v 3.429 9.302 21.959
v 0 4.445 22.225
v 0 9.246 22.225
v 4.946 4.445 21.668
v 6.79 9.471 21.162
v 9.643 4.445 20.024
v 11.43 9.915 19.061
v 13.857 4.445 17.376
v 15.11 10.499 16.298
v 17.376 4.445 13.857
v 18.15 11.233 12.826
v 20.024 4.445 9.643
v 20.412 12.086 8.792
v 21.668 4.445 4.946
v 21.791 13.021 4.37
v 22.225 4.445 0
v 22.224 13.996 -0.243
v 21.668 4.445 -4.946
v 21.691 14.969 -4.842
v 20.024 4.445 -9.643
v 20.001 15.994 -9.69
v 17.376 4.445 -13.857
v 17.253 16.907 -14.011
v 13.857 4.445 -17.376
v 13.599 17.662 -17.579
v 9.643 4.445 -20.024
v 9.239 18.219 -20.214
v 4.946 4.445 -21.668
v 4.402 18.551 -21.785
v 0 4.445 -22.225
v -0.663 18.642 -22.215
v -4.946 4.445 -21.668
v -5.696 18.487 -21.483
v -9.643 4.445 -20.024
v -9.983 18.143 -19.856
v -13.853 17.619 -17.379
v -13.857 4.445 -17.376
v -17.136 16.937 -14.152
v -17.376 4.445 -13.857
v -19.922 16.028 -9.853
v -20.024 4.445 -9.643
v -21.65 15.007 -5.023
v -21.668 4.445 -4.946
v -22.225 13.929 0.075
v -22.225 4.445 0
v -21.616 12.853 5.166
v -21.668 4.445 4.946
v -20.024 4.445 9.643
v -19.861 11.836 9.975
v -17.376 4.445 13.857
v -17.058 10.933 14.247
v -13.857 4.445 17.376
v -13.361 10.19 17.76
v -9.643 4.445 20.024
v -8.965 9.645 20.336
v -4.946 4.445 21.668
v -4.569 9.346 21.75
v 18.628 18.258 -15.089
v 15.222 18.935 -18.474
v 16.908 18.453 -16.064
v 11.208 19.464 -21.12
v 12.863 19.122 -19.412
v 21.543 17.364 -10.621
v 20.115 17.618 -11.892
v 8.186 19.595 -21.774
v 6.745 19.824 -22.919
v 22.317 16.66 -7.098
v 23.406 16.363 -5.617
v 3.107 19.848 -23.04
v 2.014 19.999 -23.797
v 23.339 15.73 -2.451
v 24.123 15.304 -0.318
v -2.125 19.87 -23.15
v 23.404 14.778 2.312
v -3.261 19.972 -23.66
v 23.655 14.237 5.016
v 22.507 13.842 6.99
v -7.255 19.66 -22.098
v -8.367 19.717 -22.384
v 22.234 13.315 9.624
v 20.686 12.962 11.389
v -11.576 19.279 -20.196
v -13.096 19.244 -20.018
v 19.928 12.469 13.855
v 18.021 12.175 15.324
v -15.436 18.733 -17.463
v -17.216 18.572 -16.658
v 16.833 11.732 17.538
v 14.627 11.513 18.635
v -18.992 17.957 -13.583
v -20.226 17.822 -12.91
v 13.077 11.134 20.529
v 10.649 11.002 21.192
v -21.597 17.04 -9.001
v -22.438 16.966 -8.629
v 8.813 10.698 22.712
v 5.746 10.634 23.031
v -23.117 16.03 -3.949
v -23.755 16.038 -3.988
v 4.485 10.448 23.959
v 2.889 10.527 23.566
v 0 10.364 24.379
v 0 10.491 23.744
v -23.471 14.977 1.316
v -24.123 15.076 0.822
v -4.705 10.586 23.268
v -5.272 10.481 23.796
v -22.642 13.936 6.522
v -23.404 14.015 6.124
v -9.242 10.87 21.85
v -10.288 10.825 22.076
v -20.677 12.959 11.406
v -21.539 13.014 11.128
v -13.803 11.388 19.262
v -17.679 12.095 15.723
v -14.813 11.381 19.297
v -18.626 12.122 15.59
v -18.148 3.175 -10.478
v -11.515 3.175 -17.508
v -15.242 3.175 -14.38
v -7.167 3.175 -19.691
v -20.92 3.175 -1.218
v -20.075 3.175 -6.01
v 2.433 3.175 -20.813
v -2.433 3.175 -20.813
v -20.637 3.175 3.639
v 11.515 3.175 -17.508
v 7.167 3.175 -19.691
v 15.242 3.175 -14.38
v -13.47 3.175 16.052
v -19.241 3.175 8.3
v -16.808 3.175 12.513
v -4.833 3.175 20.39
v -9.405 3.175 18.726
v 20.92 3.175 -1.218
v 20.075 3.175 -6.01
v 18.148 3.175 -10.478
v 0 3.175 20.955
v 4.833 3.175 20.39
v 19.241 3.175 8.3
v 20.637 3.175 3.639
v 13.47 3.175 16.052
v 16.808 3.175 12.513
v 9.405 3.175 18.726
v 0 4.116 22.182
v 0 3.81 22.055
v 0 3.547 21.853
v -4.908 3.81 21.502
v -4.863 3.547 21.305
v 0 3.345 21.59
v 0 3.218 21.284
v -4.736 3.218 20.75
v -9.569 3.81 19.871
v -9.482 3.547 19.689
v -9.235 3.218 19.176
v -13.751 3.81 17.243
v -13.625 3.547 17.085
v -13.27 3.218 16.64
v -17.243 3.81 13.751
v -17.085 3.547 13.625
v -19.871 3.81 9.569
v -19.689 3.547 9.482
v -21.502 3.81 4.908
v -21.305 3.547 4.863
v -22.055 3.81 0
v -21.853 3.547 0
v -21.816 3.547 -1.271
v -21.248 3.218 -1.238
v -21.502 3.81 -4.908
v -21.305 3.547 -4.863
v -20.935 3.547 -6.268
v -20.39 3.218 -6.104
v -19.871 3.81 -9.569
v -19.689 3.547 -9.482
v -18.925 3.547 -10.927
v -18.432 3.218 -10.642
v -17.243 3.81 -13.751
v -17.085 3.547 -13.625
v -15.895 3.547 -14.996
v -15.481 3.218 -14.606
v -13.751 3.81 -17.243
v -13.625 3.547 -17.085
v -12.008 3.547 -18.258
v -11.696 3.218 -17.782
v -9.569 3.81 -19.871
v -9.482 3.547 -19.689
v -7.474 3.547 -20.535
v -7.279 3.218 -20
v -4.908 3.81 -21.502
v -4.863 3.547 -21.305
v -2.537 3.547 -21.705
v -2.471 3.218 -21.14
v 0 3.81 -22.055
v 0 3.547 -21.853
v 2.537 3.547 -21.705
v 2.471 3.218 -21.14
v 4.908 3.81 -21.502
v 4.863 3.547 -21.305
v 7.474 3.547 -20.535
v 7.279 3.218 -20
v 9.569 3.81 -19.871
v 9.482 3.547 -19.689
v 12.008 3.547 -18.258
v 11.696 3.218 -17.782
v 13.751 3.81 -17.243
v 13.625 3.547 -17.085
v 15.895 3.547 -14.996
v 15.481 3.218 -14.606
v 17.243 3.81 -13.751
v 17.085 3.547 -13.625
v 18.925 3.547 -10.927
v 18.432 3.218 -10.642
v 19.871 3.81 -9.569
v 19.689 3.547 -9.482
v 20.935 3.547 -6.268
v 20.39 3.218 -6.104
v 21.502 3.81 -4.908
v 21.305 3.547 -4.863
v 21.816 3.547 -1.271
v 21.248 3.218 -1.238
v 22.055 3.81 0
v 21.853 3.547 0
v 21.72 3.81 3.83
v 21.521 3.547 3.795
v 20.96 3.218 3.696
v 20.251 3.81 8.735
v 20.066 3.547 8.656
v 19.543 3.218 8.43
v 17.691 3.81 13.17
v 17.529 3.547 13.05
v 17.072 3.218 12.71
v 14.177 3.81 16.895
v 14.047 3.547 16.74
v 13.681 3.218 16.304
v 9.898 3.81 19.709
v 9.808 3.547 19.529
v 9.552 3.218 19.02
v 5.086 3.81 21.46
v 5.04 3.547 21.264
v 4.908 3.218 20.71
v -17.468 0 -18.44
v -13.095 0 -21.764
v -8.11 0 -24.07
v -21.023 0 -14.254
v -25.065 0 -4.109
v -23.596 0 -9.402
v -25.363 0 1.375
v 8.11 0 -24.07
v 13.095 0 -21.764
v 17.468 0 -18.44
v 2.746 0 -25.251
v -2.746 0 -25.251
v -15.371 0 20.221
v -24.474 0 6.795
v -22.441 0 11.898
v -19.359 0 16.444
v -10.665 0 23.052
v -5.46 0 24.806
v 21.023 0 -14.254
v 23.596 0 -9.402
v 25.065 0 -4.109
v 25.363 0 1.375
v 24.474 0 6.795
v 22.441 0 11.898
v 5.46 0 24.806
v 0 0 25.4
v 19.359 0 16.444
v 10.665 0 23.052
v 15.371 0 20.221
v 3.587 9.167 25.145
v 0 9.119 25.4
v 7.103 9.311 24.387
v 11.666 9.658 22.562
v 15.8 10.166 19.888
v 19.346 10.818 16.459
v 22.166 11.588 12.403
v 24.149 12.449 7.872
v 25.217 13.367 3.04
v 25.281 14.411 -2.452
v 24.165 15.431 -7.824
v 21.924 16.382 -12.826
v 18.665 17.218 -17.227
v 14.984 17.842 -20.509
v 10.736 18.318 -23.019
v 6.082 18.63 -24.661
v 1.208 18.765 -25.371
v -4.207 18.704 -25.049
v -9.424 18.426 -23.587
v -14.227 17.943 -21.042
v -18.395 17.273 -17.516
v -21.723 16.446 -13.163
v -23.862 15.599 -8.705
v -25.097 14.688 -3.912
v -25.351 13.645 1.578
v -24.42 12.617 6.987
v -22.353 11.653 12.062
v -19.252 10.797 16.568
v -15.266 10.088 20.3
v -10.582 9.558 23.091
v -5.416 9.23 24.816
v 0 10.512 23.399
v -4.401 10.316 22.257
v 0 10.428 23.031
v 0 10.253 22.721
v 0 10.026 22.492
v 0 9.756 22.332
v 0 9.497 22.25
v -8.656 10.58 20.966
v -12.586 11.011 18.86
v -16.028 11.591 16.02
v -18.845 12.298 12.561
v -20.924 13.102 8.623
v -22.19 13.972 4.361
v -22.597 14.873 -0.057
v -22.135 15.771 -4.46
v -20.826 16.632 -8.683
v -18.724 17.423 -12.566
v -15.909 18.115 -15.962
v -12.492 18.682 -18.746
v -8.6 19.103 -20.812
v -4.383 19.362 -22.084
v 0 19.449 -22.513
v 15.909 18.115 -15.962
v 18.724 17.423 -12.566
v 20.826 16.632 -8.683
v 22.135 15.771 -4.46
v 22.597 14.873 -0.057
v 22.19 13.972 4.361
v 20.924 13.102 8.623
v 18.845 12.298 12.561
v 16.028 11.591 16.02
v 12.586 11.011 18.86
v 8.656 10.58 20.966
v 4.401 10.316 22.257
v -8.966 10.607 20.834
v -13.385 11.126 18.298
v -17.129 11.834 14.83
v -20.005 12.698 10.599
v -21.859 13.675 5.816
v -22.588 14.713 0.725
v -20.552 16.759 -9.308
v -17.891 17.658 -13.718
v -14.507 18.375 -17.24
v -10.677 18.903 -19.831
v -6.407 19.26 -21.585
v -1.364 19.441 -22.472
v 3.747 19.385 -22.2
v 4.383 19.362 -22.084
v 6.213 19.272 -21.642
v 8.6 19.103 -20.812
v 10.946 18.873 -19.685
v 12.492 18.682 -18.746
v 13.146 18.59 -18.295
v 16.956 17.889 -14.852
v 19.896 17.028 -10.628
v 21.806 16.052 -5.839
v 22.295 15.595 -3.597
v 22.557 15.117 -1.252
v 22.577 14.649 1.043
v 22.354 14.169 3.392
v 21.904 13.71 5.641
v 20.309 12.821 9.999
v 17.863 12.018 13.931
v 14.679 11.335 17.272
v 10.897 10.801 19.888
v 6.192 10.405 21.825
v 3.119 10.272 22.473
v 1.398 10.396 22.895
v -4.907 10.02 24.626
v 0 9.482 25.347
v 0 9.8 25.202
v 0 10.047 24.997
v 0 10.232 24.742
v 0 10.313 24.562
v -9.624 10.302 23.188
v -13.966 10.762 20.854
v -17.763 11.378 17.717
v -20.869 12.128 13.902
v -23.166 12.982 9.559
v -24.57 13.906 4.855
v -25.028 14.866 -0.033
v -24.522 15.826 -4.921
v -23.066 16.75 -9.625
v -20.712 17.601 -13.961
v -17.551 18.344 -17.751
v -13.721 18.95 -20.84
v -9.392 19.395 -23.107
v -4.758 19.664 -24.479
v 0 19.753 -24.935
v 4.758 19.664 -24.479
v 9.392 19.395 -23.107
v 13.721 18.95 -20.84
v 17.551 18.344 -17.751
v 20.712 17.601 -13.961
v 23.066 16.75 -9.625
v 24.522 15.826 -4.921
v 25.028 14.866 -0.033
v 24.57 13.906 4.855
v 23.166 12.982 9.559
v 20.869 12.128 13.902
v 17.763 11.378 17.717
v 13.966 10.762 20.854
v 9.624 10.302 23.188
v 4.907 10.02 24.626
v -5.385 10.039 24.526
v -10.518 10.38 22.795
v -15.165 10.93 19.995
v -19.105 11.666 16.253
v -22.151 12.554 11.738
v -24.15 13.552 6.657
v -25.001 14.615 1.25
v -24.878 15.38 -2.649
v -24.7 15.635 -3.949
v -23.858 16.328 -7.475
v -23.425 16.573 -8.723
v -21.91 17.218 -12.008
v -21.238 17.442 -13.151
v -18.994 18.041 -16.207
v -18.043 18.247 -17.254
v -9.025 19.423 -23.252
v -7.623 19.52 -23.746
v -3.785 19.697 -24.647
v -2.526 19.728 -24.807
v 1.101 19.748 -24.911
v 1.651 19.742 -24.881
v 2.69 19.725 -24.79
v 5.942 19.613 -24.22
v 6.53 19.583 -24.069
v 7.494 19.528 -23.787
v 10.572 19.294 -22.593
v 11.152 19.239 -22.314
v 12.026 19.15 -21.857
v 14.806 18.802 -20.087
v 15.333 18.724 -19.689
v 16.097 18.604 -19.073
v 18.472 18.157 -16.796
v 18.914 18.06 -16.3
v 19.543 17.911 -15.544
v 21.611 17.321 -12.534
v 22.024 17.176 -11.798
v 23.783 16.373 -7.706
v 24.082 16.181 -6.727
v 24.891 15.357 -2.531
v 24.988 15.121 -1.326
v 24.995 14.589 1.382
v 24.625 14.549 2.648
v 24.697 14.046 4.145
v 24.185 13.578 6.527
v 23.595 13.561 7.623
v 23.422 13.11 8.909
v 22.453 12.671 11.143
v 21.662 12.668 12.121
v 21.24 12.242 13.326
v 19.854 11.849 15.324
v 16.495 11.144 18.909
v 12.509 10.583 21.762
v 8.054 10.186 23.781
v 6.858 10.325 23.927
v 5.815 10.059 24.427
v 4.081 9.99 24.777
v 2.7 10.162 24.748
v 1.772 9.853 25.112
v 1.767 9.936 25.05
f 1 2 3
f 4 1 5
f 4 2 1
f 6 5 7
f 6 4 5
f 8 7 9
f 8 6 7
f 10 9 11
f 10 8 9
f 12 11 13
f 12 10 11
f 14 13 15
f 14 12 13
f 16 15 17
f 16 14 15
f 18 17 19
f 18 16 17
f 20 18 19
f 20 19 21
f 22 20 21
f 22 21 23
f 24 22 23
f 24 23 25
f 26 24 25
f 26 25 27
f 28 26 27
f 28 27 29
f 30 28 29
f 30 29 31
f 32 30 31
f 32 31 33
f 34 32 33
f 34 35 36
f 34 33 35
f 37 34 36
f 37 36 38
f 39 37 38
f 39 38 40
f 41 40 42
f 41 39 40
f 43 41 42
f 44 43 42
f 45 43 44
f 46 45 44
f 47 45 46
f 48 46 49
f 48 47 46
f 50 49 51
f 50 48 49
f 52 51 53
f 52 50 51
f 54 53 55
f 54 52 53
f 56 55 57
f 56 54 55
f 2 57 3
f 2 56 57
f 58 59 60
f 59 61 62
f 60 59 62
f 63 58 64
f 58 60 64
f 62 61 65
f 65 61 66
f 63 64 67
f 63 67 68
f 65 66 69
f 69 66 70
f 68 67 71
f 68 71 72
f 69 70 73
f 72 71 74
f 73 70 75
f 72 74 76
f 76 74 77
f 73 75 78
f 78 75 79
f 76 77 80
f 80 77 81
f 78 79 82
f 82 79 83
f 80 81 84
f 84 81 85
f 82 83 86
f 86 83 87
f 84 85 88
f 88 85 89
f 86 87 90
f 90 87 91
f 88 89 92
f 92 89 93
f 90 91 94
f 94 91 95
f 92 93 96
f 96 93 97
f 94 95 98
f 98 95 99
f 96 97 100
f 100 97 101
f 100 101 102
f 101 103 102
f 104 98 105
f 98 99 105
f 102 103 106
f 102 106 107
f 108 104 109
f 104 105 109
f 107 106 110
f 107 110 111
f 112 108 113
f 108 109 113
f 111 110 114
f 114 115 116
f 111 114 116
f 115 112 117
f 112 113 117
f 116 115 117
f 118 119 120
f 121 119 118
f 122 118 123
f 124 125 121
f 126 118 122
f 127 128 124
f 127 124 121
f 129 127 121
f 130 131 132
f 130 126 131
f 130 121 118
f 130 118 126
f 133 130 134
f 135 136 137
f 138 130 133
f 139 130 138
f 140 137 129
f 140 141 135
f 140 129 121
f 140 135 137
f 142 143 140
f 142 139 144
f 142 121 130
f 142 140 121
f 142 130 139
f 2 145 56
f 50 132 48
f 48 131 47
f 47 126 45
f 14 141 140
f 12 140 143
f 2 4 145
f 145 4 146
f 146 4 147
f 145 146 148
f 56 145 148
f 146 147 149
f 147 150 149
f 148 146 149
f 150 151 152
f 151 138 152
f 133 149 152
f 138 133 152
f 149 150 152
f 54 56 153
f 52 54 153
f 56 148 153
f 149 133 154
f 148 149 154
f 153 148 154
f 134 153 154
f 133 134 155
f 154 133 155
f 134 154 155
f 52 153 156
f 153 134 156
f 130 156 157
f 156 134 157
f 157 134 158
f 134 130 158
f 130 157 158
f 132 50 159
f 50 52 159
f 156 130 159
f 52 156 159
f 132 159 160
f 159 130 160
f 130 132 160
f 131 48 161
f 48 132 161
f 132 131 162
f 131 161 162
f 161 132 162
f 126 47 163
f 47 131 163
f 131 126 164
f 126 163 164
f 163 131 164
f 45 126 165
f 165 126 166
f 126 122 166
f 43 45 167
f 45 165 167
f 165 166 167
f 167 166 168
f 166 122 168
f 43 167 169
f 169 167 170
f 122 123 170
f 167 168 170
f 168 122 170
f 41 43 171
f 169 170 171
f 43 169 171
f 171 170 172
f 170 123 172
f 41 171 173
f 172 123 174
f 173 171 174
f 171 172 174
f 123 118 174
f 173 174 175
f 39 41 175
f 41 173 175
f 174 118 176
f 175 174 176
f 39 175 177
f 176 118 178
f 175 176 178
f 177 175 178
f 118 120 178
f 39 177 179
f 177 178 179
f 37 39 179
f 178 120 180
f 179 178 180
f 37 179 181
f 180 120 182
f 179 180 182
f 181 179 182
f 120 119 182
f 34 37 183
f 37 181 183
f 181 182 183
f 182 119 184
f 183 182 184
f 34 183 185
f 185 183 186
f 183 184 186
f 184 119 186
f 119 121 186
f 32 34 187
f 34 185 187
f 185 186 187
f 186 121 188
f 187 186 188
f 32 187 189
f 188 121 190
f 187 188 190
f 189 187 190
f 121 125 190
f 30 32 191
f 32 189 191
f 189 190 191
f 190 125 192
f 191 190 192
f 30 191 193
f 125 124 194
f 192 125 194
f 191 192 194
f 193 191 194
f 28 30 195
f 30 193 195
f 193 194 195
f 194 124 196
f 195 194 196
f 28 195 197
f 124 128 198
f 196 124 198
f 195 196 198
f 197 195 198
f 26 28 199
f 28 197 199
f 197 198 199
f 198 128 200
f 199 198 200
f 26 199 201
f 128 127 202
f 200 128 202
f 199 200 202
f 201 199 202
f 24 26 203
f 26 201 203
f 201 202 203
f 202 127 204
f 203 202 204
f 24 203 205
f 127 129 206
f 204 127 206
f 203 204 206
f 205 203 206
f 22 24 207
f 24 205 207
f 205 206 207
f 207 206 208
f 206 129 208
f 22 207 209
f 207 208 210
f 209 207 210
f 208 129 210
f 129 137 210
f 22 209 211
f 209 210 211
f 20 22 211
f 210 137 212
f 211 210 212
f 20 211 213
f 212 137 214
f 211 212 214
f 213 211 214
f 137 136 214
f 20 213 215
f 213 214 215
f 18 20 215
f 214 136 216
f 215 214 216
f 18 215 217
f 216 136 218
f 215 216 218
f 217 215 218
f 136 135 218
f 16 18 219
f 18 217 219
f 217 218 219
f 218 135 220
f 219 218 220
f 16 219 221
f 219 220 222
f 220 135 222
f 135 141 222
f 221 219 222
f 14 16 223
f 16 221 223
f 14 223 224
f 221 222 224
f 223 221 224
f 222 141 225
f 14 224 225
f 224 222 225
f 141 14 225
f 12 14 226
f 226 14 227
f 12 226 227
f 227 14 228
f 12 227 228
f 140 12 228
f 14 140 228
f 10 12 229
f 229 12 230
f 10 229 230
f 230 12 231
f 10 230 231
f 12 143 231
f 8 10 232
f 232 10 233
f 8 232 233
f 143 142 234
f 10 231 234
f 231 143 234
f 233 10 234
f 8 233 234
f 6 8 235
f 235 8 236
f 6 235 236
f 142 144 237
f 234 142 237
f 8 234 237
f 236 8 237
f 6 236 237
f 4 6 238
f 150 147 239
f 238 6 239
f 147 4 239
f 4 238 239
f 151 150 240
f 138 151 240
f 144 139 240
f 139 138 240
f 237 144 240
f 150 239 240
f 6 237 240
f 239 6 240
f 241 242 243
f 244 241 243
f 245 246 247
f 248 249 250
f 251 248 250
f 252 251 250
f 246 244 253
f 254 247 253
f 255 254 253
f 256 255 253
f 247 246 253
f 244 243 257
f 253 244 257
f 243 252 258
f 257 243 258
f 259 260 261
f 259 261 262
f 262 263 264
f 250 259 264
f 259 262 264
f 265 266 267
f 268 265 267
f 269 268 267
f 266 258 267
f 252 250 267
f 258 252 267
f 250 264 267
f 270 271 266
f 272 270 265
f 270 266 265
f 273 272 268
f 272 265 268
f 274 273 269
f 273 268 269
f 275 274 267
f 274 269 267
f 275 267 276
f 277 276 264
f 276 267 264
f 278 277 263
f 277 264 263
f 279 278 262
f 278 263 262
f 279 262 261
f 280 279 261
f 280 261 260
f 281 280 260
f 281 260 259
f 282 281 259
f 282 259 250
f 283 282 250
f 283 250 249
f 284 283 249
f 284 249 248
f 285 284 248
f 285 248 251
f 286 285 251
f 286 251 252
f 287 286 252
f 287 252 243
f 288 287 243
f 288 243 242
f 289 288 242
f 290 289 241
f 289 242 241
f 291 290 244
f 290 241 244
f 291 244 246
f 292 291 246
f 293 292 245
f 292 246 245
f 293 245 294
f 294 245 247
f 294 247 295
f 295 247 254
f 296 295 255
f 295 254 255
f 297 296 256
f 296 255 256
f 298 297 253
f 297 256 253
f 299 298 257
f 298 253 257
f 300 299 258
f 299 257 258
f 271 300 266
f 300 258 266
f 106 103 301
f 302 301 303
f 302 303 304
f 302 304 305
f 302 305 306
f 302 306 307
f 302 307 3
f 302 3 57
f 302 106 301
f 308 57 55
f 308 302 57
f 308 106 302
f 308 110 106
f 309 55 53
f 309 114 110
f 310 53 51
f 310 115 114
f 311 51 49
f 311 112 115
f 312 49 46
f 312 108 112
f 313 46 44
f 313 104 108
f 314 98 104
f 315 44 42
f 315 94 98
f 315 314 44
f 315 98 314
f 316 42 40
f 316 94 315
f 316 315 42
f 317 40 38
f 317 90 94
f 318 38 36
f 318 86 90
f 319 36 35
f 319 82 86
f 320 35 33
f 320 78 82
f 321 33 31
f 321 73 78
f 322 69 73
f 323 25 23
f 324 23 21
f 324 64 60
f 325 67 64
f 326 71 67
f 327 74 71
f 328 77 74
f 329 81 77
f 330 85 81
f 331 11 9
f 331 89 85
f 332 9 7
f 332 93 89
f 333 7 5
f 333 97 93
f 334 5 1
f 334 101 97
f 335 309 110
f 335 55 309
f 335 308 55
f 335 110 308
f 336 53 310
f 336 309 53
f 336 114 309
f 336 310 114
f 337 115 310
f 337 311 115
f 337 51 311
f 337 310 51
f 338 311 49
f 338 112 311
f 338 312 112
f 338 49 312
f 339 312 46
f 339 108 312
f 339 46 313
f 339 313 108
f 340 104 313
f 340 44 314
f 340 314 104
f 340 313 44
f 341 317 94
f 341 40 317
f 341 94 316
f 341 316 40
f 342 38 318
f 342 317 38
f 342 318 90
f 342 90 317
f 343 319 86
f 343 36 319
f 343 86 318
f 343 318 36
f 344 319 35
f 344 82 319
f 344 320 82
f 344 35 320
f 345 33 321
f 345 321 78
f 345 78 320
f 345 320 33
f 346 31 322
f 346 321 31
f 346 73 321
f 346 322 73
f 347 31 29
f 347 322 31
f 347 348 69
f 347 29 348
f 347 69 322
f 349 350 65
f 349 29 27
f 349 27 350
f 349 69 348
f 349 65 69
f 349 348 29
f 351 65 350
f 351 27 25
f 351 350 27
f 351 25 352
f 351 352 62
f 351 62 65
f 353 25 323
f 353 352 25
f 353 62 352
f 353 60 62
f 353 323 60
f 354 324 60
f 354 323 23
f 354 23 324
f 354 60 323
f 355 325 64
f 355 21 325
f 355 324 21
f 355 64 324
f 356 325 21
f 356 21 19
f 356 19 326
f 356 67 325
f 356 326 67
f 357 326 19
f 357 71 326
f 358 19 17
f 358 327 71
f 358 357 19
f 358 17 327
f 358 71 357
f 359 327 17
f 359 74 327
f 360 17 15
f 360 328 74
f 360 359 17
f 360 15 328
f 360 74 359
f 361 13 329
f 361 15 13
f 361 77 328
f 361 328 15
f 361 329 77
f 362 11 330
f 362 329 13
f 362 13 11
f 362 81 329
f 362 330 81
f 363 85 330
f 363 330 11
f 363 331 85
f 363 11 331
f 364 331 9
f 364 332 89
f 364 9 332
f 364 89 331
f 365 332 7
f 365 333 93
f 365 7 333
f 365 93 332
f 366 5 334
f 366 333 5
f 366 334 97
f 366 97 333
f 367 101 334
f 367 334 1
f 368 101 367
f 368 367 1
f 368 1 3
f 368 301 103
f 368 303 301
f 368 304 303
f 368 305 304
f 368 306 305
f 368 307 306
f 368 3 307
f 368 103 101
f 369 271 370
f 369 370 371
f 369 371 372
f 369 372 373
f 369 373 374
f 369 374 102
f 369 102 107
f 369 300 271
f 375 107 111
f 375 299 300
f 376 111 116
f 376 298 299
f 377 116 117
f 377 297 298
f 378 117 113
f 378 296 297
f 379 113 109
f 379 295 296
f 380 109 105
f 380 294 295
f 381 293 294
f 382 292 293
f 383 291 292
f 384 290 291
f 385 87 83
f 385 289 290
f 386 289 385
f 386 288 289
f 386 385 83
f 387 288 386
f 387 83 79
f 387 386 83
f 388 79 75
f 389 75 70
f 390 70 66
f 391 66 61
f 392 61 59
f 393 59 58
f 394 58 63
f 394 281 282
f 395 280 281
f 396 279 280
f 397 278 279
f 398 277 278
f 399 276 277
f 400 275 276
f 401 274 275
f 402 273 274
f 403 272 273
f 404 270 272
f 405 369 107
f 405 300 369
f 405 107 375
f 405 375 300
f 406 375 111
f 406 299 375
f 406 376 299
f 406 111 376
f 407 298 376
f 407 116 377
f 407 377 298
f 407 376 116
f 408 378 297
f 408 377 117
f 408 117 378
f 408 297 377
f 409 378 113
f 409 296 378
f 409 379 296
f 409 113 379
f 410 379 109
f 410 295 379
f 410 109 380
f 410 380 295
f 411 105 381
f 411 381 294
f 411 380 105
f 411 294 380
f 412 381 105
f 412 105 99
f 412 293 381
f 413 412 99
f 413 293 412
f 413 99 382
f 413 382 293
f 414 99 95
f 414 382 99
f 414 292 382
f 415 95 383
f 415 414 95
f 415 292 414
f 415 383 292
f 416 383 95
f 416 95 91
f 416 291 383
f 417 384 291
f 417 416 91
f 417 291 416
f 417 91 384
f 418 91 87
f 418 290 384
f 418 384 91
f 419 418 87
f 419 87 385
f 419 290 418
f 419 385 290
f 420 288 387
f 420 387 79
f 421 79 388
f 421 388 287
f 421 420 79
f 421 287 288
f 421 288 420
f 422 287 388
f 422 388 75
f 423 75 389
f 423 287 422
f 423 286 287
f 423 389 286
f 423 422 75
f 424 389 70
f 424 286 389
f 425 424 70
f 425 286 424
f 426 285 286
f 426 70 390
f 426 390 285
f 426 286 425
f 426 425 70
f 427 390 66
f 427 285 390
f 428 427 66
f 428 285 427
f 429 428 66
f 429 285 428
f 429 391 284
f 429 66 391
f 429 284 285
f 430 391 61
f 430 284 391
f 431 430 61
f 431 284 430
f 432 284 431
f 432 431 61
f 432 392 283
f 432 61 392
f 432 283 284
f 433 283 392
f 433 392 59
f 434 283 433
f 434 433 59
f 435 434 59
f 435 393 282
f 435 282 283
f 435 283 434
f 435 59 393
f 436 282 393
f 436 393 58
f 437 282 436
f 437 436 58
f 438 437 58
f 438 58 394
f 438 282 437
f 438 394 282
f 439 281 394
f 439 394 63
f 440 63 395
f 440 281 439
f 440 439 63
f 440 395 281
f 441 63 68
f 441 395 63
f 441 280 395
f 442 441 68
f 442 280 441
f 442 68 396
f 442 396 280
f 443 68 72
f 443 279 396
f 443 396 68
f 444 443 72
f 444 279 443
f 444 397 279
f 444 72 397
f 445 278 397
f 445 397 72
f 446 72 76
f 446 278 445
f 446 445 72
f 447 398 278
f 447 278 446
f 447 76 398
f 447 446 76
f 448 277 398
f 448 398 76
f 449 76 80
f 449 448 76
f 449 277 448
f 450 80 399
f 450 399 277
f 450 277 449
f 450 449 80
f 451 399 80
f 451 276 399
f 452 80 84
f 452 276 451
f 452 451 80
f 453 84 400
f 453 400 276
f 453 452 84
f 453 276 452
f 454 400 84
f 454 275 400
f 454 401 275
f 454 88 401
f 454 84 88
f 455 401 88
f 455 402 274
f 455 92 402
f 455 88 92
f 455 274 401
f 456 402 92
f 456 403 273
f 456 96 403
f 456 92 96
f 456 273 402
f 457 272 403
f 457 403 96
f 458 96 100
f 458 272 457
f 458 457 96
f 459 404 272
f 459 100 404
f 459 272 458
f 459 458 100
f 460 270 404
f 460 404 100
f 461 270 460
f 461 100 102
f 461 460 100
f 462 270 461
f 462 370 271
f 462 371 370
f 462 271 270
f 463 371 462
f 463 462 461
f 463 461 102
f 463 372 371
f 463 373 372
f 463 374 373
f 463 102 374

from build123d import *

# Parameters (mm, degrees)
SKETCH1_R               = 25.4
BOSS_EXTRUDE1_DEPTH     = 20.32
SHELL1_T                = -3.175
CUT_EXTRUDE1_DEPTH      = 42.270115096
CUT_EXTRUDE1_DEPTH_BACK = 42.270115096
FILLET1_R               = 1.27


with BuildPart() as part:
    # Sketch1 → Boss-Extrude1 (new body)
    with BuildSketch(Plane(origin=(0, 0, 0), x_dir=(1, 0, 0), z_dir=(0, 1, 0))):
        with Locations(Location((0, 0, 0), (0, 0, 270))):
            Circle(SKETCH1_R)
    extrude(amount=BOSS_EXTRUDE1_DEPTH)

    # Shell1
    shell1_openings = [part.faces().sort_by_distance(p)[0] for p in [
        (0, 20.32, 0),
    ]]
    offset(amount=SHELL1_T, openings=shell1_openings, kind=Kind.INTERSECTION)

    # Sketch2 → Cut-Extrude1 (cut, two sides: drawn at the far end of the back side and taken through both)
    with BuildSketch(Plane(origin=(0, 0, 0), x_dir=(0, 0, -1), z_dir=(1, 0, 0)).offset(-CUT_EXTRUDE1_DEPTH_BACK)):
        Polygon((-25.4, 10.16), (-25.4, 20.32), (25.4, 20.32), align=None)
    extrude(amount=CUT_EXTRUDE1_DEPTH + CUT_EXTRUDE1_DEPTH_BACK, mode=Mode.SUBTRACT)

    # Fillet1
    fillet1_edges = [part.edges().sort_by_distance(p)[0] for p in [
        (-25.4, 15.240000004, -2e-08),
        (3.323e-06, 19.685, -22.225),
        (0, 3.175, -22.225),
    ]]
    fillet(fillet1_edges, radius=FILLET1_R)


solid = part.part
